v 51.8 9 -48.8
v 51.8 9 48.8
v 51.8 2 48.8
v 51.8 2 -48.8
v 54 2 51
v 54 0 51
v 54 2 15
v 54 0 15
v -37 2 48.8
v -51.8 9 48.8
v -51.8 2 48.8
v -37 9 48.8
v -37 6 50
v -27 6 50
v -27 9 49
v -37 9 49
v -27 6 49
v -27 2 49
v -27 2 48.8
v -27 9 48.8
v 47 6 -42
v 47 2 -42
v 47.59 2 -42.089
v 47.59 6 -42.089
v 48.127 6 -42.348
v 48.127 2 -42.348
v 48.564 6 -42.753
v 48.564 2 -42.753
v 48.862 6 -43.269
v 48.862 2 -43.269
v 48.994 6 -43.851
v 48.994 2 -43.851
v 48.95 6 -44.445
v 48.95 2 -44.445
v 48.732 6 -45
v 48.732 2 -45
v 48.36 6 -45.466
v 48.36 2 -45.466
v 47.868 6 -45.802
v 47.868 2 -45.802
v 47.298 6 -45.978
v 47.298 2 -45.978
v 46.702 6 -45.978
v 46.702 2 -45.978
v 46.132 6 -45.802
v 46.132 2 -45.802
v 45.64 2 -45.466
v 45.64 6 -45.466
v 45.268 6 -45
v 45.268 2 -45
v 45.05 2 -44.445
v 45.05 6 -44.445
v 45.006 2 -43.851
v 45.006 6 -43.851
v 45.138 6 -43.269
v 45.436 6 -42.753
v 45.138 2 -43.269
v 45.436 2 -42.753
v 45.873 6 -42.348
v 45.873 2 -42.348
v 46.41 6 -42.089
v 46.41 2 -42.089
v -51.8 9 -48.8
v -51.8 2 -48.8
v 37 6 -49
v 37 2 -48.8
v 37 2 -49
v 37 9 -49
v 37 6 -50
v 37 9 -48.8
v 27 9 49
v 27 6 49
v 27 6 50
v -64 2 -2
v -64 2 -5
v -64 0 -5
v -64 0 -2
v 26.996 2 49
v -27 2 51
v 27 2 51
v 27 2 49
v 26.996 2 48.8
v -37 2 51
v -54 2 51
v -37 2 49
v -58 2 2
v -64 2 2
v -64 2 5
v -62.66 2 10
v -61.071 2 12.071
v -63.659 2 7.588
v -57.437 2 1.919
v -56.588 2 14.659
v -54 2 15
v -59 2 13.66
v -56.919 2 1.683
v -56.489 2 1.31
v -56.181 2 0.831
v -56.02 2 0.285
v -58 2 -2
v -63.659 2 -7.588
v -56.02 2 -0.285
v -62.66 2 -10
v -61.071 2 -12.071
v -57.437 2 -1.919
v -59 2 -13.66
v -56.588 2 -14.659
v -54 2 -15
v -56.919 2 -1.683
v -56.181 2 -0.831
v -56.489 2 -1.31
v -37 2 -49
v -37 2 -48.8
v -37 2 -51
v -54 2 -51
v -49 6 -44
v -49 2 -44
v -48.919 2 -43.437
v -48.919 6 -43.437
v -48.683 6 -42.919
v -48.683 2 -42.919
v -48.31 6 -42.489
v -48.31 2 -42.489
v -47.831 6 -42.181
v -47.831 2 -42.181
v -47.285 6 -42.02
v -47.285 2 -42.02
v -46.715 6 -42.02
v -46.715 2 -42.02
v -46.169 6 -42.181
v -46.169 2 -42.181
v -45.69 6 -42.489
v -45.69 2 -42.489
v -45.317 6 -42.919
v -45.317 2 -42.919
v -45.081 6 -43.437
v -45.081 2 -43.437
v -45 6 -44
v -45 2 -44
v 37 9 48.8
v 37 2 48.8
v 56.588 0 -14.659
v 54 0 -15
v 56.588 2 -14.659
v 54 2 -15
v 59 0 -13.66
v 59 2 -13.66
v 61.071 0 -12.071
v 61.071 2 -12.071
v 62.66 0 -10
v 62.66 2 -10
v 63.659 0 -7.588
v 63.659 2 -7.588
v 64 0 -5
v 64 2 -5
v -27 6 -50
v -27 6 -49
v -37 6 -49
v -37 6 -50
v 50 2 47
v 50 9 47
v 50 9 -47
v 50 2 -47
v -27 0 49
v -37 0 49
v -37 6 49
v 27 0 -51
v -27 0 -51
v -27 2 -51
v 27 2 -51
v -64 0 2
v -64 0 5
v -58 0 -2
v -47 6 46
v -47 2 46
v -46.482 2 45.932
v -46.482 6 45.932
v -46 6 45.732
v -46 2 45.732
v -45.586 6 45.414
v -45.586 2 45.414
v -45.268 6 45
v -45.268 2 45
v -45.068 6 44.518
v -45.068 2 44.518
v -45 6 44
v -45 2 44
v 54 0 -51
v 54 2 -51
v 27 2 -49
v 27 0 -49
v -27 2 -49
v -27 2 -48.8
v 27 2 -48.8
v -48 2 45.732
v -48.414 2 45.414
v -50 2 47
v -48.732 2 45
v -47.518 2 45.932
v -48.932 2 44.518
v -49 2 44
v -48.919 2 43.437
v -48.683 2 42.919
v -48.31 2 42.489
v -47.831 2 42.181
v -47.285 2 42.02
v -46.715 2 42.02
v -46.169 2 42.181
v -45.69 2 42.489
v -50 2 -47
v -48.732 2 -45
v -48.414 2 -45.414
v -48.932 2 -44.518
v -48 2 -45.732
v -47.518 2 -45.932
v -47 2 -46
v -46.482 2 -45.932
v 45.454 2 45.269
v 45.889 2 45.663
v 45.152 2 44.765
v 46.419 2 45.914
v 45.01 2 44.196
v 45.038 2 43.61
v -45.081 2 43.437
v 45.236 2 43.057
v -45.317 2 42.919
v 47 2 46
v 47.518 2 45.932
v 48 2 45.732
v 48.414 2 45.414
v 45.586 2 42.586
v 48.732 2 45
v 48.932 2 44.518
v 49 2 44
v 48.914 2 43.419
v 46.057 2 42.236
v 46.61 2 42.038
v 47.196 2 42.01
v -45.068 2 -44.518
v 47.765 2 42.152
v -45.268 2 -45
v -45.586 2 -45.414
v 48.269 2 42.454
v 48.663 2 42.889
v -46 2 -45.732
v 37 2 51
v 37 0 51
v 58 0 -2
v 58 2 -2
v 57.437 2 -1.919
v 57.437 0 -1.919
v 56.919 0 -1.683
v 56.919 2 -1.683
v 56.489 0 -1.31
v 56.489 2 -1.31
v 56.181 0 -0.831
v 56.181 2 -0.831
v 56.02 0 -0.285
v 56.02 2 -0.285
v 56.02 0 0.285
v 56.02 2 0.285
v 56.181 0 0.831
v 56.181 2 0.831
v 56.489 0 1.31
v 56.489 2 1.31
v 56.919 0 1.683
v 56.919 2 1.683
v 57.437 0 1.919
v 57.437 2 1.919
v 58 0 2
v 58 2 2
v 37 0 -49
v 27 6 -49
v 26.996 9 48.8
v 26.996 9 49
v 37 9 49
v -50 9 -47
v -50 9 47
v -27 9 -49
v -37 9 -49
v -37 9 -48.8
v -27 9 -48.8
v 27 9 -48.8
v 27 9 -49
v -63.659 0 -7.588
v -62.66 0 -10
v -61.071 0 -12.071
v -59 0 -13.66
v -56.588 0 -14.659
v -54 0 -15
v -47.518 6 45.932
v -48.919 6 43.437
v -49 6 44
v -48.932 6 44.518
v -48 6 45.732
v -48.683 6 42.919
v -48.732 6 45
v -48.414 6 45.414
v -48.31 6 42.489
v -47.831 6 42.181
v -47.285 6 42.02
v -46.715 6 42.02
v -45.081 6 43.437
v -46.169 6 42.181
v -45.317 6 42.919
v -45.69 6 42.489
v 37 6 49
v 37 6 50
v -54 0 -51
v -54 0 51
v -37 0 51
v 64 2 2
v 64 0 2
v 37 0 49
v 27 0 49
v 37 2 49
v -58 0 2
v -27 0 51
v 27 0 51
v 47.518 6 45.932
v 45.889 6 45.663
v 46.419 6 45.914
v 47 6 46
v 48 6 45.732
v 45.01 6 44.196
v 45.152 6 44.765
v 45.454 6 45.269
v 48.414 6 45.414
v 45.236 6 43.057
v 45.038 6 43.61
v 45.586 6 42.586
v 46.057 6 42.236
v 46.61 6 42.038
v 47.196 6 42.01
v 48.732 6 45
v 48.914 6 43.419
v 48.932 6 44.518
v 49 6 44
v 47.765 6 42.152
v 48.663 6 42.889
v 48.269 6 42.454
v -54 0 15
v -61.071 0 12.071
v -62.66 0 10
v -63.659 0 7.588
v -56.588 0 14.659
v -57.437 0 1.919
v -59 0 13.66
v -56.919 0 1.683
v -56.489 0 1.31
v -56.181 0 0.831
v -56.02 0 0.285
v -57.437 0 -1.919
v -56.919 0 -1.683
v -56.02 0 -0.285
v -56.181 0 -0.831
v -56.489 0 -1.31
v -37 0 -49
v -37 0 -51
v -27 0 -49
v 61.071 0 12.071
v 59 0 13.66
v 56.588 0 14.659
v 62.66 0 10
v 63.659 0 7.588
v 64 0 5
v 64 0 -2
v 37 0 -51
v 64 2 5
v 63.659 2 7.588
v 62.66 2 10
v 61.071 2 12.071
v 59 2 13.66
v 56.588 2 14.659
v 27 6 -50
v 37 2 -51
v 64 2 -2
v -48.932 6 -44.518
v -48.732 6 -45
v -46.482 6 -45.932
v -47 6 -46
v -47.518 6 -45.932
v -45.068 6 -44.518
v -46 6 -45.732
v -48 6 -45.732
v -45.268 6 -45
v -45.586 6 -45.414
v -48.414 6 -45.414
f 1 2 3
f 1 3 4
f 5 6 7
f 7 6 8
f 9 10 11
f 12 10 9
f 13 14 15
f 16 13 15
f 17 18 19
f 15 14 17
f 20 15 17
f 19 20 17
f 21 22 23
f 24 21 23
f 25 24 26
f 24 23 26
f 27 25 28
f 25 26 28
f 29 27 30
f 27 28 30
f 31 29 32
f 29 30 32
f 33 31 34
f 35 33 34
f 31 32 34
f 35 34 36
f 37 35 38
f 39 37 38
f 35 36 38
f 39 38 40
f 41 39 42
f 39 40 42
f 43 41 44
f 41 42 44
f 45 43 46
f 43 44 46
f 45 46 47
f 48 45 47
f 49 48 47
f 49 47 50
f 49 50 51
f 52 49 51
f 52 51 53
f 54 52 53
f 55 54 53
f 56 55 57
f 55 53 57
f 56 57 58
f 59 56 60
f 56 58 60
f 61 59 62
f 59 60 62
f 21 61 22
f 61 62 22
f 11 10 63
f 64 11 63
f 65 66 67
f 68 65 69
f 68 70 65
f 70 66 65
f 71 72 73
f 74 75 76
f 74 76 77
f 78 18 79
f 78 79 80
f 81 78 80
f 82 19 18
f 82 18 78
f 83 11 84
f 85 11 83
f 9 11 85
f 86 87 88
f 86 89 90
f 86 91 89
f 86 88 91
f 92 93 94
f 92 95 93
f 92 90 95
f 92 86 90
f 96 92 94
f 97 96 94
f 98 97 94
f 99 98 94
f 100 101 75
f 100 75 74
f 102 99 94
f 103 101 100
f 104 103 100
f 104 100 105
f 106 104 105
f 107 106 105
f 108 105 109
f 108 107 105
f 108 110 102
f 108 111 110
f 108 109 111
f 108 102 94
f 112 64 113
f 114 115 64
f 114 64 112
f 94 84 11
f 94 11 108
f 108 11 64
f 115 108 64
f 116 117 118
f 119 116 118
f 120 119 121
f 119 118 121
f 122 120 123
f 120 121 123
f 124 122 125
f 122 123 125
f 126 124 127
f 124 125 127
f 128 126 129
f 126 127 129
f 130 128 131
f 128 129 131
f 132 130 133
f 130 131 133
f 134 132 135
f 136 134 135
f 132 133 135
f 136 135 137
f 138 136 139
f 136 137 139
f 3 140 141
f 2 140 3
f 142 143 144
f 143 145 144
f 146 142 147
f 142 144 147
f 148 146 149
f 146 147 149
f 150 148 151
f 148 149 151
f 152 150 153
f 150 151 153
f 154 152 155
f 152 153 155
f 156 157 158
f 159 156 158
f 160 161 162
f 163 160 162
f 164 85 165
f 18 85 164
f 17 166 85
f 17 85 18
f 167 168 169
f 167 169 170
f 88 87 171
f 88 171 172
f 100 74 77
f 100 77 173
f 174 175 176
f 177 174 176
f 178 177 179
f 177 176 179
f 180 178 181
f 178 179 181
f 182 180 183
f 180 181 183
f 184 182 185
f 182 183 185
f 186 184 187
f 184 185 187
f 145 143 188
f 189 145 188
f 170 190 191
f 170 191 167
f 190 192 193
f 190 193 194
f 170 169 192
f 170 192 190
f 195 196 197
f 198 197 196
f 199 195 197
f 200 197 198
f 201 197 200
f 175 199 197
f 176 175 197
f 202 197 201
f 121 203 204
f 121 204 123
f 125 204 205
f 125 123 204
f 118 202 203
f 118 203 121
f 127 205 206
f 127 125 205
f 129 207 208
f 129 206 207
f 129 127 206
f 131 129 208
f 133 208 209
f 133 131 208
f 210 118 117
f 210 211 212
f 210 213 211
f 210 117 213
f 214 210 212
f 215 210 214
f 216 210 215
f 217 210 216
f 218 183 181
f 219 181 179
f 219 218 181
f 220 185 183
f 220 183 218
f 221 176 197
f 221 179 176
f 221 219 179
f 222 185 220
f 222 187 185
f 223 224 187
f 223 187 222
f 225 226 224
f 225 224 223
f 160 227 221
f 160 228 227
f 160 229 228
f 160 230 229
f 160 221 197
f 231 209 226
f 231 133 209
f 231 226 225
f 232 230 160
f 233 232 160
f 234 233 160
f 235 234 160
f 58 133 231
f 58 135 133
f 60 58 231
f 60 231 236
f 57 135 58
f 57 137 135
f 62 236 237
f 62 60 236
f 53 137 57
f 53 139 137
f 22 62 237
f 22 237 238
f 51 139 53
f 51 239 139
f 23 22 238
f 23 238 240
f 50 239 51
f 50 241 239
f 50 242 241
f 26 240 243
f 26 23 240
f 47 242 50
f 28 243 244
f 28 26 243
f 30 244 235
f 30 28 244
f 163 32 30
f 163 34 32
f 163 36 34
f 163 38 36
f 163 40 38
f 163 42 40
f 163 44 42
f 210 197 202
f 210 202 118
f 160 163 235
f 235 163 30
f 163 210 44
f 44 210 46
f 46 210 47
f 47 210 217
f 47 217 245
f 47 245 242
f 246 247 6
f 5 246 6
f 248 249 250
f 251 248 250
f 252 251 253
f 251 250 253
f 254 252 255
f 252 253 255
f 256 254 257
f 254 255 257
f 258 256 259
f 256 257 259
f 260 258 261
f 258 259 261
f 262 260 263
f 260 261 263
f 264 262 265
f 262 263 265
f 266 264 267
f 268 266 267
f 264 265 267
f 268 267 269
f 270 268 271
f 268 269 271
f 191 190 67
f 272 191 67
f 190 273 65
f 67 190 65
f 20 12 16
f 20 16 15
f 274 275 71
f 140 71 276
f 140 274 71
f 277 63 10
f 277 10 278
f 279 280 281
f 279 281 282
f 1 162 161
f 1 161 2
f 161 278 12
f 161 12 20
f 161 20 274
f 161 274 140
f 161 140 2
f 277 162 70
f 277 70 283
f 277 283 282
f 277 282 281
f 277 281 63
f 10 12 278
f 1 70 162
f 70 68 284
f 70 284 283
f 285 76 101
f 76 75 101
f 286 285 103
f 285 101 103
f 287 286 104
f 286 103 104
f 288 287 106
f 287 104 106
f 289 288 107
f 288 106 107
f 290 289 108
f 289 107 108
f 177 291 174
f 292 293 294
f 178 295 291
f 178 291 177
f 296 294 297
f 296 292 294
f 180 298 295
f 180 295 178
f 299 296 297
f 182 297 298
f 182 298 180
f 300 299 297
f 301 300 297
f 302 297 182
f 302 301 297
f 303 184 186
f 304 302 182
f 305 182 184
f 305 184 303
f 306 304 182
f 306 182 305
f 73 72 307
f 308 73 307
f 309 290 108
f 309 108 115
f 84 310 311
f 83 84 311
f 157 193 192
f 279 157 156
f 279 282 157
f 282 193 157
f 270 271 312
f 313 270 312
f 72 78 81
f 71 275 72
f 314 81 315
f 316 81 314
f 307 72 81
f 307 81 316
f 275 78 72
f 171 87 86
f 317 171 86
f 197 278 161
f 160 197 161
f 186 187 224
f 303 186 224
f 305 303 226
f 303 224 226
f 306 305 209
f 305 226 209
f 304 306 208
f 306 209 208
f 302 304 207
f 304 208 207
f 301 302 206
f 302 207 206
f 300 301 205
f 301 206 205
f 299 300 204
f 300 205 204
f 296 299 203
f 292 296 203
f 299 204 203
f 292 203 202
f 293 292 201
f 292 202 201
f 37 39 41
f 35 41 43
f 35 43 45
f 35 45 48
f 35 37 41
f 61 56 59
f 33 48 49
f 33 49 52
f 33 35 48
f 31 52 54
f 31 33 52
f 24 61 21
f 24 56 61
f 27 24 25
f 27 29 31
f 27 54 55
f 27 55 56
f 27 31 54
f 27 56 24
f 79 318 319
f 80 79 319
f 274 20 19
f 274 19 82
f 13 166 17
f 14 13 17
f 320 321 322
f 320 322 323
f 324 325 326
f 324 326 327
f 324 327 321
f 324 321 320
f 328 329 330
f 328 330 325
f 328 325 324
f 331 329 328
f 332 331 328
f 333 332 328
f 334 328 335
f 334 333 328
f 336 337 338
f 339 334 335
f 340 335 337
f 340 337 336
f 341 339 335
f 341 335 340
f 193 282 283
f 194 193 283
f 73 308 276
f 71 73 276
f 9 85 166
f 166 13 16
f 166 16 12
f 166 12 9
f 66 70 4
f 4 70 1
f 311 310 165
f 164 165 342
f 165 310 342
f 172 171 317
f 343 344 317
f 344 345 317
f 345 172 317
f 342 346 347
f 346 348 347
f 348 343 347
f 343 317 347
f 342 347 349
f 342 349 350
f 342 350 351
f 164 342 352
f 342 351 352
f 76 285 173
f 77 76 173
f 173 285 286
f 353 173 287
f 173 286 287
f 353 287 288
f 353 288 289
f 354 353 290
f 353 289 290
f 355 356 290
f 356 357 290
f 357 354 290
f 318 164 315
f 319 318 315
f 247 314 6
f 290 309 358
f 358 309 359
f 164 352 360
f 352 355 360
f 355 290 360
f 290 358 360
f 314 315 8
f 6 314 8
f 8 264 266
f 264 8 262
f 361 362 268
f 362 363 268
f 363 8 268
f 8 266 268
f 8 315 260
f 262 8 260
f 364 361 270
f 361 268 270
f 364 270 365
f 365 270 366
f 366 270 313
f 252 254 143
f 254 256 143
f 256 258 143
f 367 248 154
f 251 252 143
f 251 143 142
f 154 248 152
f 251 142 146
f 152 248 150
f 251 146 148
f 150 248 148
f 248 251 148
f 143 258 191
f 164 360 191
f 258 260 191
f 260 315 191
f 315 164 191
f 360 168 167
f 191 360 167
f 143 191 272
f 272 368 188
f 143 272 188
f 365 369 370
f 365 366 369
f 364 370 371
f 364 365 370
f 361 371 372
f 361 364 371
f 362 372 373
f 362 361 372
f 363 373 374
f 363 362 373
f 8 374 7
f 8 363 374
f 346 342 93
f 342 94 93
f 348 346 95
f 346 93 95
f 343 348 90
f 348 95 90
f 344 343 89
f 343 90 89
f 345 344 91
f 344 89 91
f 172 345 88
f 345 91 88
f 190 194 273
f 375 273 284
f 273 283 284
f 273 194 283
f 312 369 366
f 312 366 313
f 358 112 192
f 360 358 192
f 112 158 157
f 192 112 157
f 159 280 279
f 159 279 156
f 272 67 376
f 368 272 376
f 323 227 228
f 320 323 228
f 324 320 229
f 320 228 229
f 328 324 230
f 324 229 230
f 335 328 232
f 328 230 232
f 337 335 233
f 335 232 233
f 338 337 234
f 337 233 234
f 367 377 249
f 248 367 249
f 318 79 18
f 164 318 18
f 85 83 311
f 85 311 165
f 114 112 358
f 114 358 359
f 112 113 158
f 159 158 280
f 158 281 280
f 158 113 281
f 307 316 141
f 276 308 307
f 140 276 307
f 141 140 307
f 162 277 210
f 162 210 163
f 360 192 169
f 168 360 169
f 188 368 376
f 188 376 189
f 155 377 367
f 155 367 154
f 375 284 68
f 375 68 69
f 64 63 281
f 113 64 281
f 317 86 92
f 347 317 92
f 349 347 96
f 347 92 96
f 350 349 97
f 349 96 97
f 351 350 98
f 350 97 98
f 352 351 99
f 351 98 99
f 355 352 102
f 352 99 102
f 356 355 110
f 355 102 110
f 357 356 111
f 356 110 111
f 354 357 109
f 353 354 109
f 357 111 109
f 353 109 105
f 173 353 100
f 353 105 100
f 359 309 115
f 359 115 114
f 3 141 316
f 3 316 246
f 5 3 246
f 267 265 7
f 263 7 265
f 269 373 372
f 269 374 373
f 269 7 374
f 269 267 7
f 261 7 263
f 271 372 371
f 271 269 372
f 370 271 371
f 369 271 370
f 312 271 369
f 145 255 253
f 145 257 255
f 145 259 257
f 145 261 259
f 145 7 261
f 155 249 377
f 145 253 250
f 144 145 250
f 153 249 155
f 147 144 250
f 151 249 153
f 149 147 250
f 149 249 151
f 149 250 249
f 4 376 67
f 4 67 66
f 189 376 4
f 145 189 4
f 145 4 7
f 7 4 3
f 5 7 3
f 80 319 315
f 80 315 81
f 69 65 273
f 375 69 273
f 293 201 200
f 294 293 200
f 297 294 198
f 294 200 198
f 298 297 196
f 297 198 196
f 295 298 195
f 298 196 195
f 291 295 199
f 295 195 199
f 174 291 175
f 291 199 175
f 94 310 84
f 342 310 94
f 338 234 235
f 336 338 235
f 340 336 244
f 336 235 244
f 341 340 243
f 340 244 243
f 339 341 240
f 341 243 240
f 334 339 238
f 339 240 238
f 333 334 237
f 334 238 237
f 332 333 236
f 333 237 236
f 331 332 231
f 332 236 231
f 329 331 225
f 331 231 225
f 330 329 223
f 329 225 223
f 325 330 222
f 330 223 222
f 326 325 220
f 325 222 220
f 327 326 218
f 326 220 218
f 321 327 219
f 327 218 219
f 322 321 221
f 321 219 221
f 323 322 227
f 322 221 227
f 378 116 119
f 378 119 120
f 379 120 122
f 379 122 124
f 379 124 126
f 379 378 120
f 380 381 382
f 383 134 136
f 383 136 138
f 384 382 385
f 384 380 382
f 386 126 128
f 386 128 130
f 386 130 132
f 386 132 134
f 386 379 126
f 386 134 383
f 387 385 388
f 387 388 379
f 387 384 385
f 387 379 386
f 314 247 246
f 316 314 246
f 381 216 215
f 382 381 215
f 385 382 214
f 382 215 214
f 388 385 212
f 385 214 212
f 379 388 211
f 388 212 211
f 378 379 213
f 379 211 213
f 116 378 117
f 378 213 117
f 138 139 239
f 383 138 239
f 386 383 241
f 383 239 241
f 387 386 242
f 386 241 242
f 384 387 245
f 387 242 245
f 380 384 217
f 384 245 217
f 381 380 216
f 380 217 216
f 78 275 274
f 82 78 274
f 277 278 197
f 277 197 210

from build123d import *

# Parameters (mm, degrees)
SKETCH1_W            = 108
SKETCH1_H            = 102
BOSS_EXTRUDE1_DEPTH  = 2
SKETCH2_W            = 104
SKETCH2_H            = 98
BOSS_EXTRUDE2_DEPTH  = 7
SKETCH3_W            = 100
SKETCH3_H            = 94
CUT_EXTRUDE1_DEPTH   = 7
SKETCH4_W            = 10
SKETCH4_H            = 3
BOSS_EXTRUDE6_DEPTH  = 1
CUT_EXTRUDE2_DEPTH   = 10
SKETCH6_W            = 10
SKETCH6_H            = 3
BOSS_EXTRUDE7_DEPTH  = 1
CUT_EXTRUDE3_DEPTH   = 10
SKETCH9_W            = 10
SKETCH9_H            = 3
BOSS_EXTRUDE9_DEPTH  = 1
CUT_EXTRUDE4_DEPTH   = 10
SKETCH11_W           = 10
SKETCH11_H           = 3
BOSS_EXTRUDE10_DEPTH = 1
CUT_EXTRUDE5_DEPTH   = 10
SKETCH20_W           = 10
SKETCH20_H           = 2
CUT_EXTRUDE7_DEPTH   = 2
SKETCH21_W           = 10
SKETCH21_H           = 2
CUT_EXTRUDE8_DEPTH   = 2
SKETCH22_W           = 10
SKETCH22_H           = 2
CUT_EXTRUDE9_DEPTH   = 2
SKETCH23_W           = 10
SKETCH23_H           = 2
CUT_EXTRUDE11_DEPTH  = 2
SKETCH24_R           = 2
BOSS_EXTRUDE11_DEPTH = 4
BOSS_EXTRUDE12_DEPTH = 4
BOSS_EXTRUDE13_DEPTH = 4
BOSS_EXTRUDE14_DEPTH = 4
SKETCH28_W           = 30
SKETCH28_H           = 2
BOSS_EXTRUDE15_DEPTH = 10
SKETCH29_R           = 2
SKETCH29_W           = 6
SKETCH29_H           = 4
CUT_EXTRUDE12_DEPTH  = 2
FILLET1_R            = 10
SKETCH30_W           = 30
SKETCH30_H           = 1
BOSS_EXTRUDE16_DEPTH = 10
CUT_EXTRUDE13_DEPTH  = 2
FILLET2_R            = 10
SKETCH33_W           = 0.2
SKETCH33_H           = 98
CUT_EXTRUDE14_DEPTH  = 7
SKETCH34_W           = 14.8
SKETCH34_H           = 0.2
CUT_EXTRUDE15_DEPTH  = 7
SKETCH35_W           = 54
SKETCH35_H           = 0.2
CUT_EXTRUDE16_DEPTH  = 7
SKETCH36_W           = 15
SKETCH36_H           = 0.2
CUT_EXTRUDE17_DEPTH  = 7
SKETCH37_W           = 0.2
SKETCH37_H           = 97.8
CUT_EXTRUDE18_DEPTH  = 7
SKETCH39_W           = 14.8
SKETCH39_H           = 0.2
CUT_EXTRUDE19_DEPTH  = 7
SKETCH41_W           = 53.996290736
SKETCH41_H           = 0.2
CUT_EXTRUDE20_DEPTH  = 7
SKETCH42_W           = 14.8
SKETCH42_H           = 0.2
CUT_EXTRUDE21_DEPTH  = 7


with BuildPart() as part:
    # Sketch1 → Boss-Extrude1 (new body)
    with BuildSketch(Plane(origin=(0, 0, 0), x_dir=(1, 0, 0), z_dir=(0, 1, 0))):
        Rectangle(SKETCH1_W, SKETCH1_H)
    extrude(amount=BOSS_EXTRUDE1_DEPTH)

    # Sketch2 → Boss-Extrude2 (add)
    with BuildSketch(Plane(origin=(0, 2, 0), x_dir=(1, 0, 0), z_dir=(0, 1, 0))):
        Rectangle(SKETCH2_W, SKETCH2_H)
    extrude(amount=BOSS_EXTRUDE2_DEPTH)

    # Sketch3 → Cut-Extrude1 (cut)
    with BuildSketch(Plane(origin=(0, 9, 0), x_dir=(1, 0, 0), z_dir=(0, 1, 0))):
        Rectangle(SKETCH3_W, SKETCH3_H)
    extrude(amount=-CUT_EXTRUDE1_DEPTH, mode=Mode.SUBTRACT)

    # Sketch4 → Boss-Extrude6 (add)
    with BuildSketch(Plane.XY.offset(49)):
        with Locations((-32, 7.5)):
            Rectangle(SKETCH4_W, SKETCH4_H)
    extrude(amount=BOSS_EXTRUDE6_DEPTH)

    # Sketch5 → Cut-Extrude2 (cut)
    with BuildSketch(Plane(origin=(-27, 0, 0), x_dir=(0, 0, -1), z_dir=(1, 0, 0))):
        Polygon((-50, 6), (-49, 9), (-50, 9), align=None)
    extrude(amount=-CUT_EXTRUDE2_DEPTH, mode=Mode.SUBTRACT)

    # Sketch6 → Boss-Extrude7 (add)
    with BuildSketch(Plane.XY.offset(49)):
        with Locations((32, 7.5)):
            Rectangle(SKETCH6_W, SKETCH6_H)
    extrude(amount=BOSS_EXTRUDE7_DEPTH)

    # Sketch7 → Cut-Extrude3 (cut)
    with BuildSketch(Plane(origin=(37, 0, 0), x_dir=(0, 0, -1), z_dir=(1, 0, 0))):
        Polygon((-50, 6), (-49, 9), (-50, 9), align=None)
    extrude(amount=-CUT_EXTRUDE3_DEPTH, mode=Mode.SUBTRACT)

    # Sketch9 → Boss-Extrude9 (add)
    with BuildSketch(Plane(origin=(0, 0, -49), x_dir=(-1, 0, 0), z_dir=(0, 0, -1))):
        with Locations((-32, 7.5)):
            Rectangle(SKETCH9_W, SKETCH9_H)
    extrude(amount=BOSS_EXTRUDE9_DEPTH)

    # Sketch10 → Cut-Extrude4 (cut)
    with BuildSketch(Plane.ZY.offset(-27)):
        Polygon((-49, 9), (-50, 6), (-50, 9), align=None)
    extrude(amount=-CUT_EXTRUDE4_DEPTH, mode=Mode.SUBTRACT)

    # Sketch11 → Boss-Extrude10 (add)
    with BuildSketch(Plane(origin=(0, 0, -49), x_dir=(-1, 0, 0), z_dir=(0, 0, -1))):
        with Locations((32, 7.5)):
            Rectangle(SKETCH11_W, SKETCH11_H)
    extrude(amount=BOSS_EXTRUDE10_DEPTH)

    # Sketch12 → Cut-Extrude5 (cut)
    with BuildSketch(Plane.ZY.offset(37)):
        Polygon((-49, 9), (-50, 6), (-50, 9), align=None)
    extrude(amount=-CUT_EXTRUDE5_DEPTH, mode=Mode.SUBTRACT)

    # Sketch20 → Cut-Extrude7 (cut)
    with BuildSketch(Plane.XY.offset(51)):
        with Locations((32, 1)):
            Rectangle(SKETCH20_W, SKETCH20_H)
    extrude(amount=-CUT_EXTRUDE7_DEPTH, mode=Mode.SUBTRACT)

    # Sketch21 → Cut-Extrude8 (cut)
    with BuildSketch(Plane(origin=(0, 2, 0), x_dir=(1, 0, 0), z_dir=(0, 1, 0))):
        with Locations((-32, -50)):
            Rectangle(SKETCH21_W, SKETCH21_H)
    extrude(amount=-CUT_EXTRUDE8_DEPTH, mode=Mode.SUBTRACT)

    # Sketch22 → Cut-Extrude9 (cut)
    with BuildSketch(Plane(origin=(0, 2, 0), x_dir=(1, 0, 0), z_dir=(0, 1, 0))):
        with Locations((32, 50)):
            Rectangle(SKETCH22_W, SKETCH22_H)
    extrude(amount=-CUT_EXTRUDE9_DEPTH, mode=Mode.SUBTRACT)

    # Sketch23 → Cut-Extrude11 (cut)
    with BuildSketch(Plane(origin=(0, 2, 0), x_dir=(1, 0, 0), z_dir=(0, 1, 0))):
        with Locations((-32, 50)):
            Rectangle(SKETCH23_W, SKETCH23_H)
    extrude(amount=-CUT_EXTRUDE11_DEPTH, mode=Mode.SUBTRACT)

    # Sketch24 → Boss-Extrude11 (add)
    with BuildSketch(Plane(origin=(0, 2, 0), x_dir=(1, 0, 0), z_dir=(0, 1, 0))):
        with Locations(Location((47, 44, 0), (0, 0, 270))):
            Circle(SKETCH24_R)
    extrude(amount=BOSS_EXTRUDE11_DEPTH)

    # Sketch25 → Boss-Extrude12 (add)
    with BuildSketch(Plane(origin=(0, 2, 0), x_dir=(1, 0, 0), z_dir=(0, 1, 0))):
        with BuildLine():
            ThreePointArc((-45, 44), (-45.585786438, 45.414213562), (-47, 46))
            Line((-47, 46), (-47, 44))
            Line((-47, 44), (-49, 44))
            ThreePointArc((-49, 44), (-47, 42), (-45, 44))
        make_face()
        with BuildLine():
            Line((-47, 44), (-47, 46))
            ThreePointArc((-47, 46), (-48.414213562, 45.414213562), (-49, 44))
            Line((-49, 44), (-47, 44))
        make_face()
    extrude(amount=BOSS_EXTRUDE12_DEPTH)

    # Sketch26 → Boss-Extrude13 (add)
    with BuildSketch(Plane(origin=(0, 2, 0), x_dir=(1, 0, 0), z_dir=(0, 1, 0))):
        with BuildLine():
            ThreePointArc((-49, -44), (-48.414213562, -45.414213562), (-47, -46))
            Line((-47, -46), (-47, -44))
            Line((-47, -44), (-49, -44))
        make_face()
        with BuildLine():
            Line((-47, -44), (-47, -46))
            ThreePointArc((-47, -46), (-45.585786438, -45.414213562), (-45, -44))
            ThreePointArc((-45, -44), (-47, -42), (-49, -44))
            Line((-49, -44), (-47, -44))
        make_face()
    extrude(amount=BOSS_EXTRUDE13_DEPTH)

    # Sketch27 → Boss-Extrude14 (add)
    with BuildSketch(Plane(origin=(0, 2, 0), x_dir=(1, 0, 0), z_dir=(0, 1, 0))):
        with BuildLine():
            ThreePointArc((49, -44), (45.585786438, -42.585786438), (47, -46))
            Line((47, -46), (47, -44))
            Line((47, -44), (49, -44))
        make_face()
        with BuildLine():
            Line((47, -44), (47, -46))
            ThreePointArc((47, -46), (48.414213562, -45.414213562), (49, -44))
            Line((49, -44), (47, -44))
        make_face()
    extrude(amount=BOSS_EXTRUDE14_DEPTH)

    # Sketch28 → Boss-Extrude15 (add)
    with BuildSketch(Plane.ZY.offset(54)):
        with Locations((0, 1)):
            Rectangle(SKETCH28_W, SKETCH28_H)
    extrude(amount=BOSS_EXTRUDE15_DEPTH)

    # Sketch29 → Cut-Extrude12 (cut)
    with BuildSketch(Plane(origin=(0, 2, 0), x_dir=(1, 0, 0), z_dir=(0, 1, 0))):
        with Locations((-58, 0)):
            Circle(SKETCH29_R)
        with Locations((-61, 0)):
            Rectangle(SKETCH29_W, SKETCH29_H)
    extrude(amount=-CUT_EXTRUDE12_DEPTH, mode=Mode.SUBTRACT)

    # Fillet1
    fillet1_edges = [part.edges().sort_by_distance(p)[0] for p in [
        (-64, 1, 15),
        (-64, 1, -15),
    ]]
    fillet(fillet1_edges, radius=FILLET1_R - 0.0001)  # a hair under: the kernel refuses the full size

    # Sketch30 → Boss-Extrude16 (add)
    with BuildSketch(Plane(origin=(54, 0, 0), x_dir=(0, 0, -1), z_dir=(1, 0, 0))):
        with Locations((0, 1.5)):
            Rectangle(SKETCH30_W, SKETCH30_H)
        with Locations((0, 0.5)):
            Rectangle(SKETCH30_W, SKETCH30_H)
    extrude(amount=BOSS_EXTRUDE16_DEPTH)

    # Sketch32 → Cut-Extrude13 (cut)
    with BuildSketch(Plane(origin=(0, 2, 0), x_dir=(1, 0, 0), z_dir=(0, 1, 0))):
        with BuildLine():
            Line((58, -2), (64, -2))
            Line((64, -2), (64, 2))
            Line((64, 2), (58, 2))
            ThreePointArc((58, 2), (59.414213562, 1.414213562), (60, 0))
            ThreePointArc((60, 0), (59.414213562, -1.414213562), (58, -2))
        make_face()
        with BuildLine():
            ThreePointArc((58, 2), (56, 0), (58, -2))
            Line((58, -2), (58, 2))
        make_face()
        with BuildLine():
            Line((58, 2), (58, -2))
            ThreePointArc((58, -2), (59.414213562, -1.414213562), (60, 0))
            ThreePointArc((60, 0), (59.414213562, 1.414213562), (58, 2))
        make_face()
    extrude(amount=-CUT_EXTRUDE13_DEPTH, mode=Mode.SUBTRACT)

    # Fillet2
    fillet2_edges = [part.edges().sort_by_distance(p)[0] for p in [
        (64, 1, -15),
        (64, 1, 15),
    ]]
    fillet(fillet2_edges, radius=FILLET2_R - 0.0001)  # a hair under: the kernel refuses the full size

    # Sketch33 → Cut-Extrude14 (cut)
    with BuildSketch(Plane(origin=(0, 9, 0), x_dir=(1, 0, 0), z_dir=(0, 1, 0))):
        with Locations((51.9, 0)):
            Rectangle(SKETCH33_W, SKETCH33_H)
    extrude(amount=-CUT_EXTRUDE14_DEPTH, mode=Mode.SUBTRACT)

    # Sketch34 → Cut-Extrude15 (cut)
    with BuildSketch(Plane(origin=(0, 9, 0), x_dir=(1, 0, 0), z_dir=(0, 1, 0))):
        with Locations((44.4, 48.9)):
            Rectangle(SKETCH34_W, SKETCH34_H)
    extrude(amount=-CUT_EXTRUDE15_DEPTH, mode=Mode.SUBTRACT)

    # Sketch35 → Cut-Extrude16 (cut)
    with BuildSketch(Plane(origin=(0, 9, 0), x_dir=(1, 0, 0), z_dir=(0, 1, 0))):
        with Locations((0, 48.9)):
            Rectangle(SKETCH35_W, SKETCH35_H)
    extrude(amount=-CUT_EXTRUDE16_DEPTH, mode=Mode.SUBTRACT)

    # Sketch36 → Cut-Extrude17 (cut)
    with BuildSketch(Plane(origin=(0, 9, 0), x_dir=(1, 0, 0), z_dir=(0, 1, 0))):
        with Locations((-44.5, 48.9)):
            Rectangle(SKETCH36_W, SKETCH36_H)
    extrude(amount=-CUT_EXTRUDE17_DEPTH, mode=Mode.SUBTRACT)

    # Sketch37 → Cut-Extrude18 (cut)
    with BuildSketch(Plane(origin=(0, 9, 0), x_dir=(1, 0, 0), z_dir=(0, 1, 0))):
        with Locations((-51.9, -0.1)):
            Rectangle(SKETCH37_W, SKETCH37_H)
    extrude(amount=-CUT_EXTRUDE18_DEPTH, mode=Mode.SUBTRACT)

    # Sketch39 → Cut-Extrude19 (cut)
    with BuildSketch(Plane(origin=(0, 9, 0), x_dir=(1, 0, 0), z_dir=(0, 1, 0))):
        with Locations((-44.4, -48.9)):
            Rectangle(SKETCH39_W, SKETCH39_H)
    extrude(amount=-CUT_EXTRUDE19_DEPTH, mode=Mode.SUBTRACT)

    # Sketch41 → Cut-Extrude20 (cut)
    with BuildSketch(Plane(origin=(0, 9, 0), x_dir=(1, 0, 0), z_dir=(0, 1, 0))):
        with Locations((-0.001854632, -48.9)):
            Rectangle(SKETCH41_W, SKETCH41_H)
    extrude(amount=-CUT_EXTRUDE20_DEPTH, mode=Mode.SUBTRACT)

    # Sketch42 → Cut-Extrude21 (cut)
    with BuildSketch(Plane(origin=(0, 9, 0), x_dir=(1, 0, 0), z_dir=(0, 1, 0))):
        with Locations((44.4, -48.9)):
            Rectangle(SKETCH42_W, SKETCH42_H)
    extrude(amount=-CUT_EXTRUDE21_DEPTH, mode=Mode.SUBTRACT)


solid = part.part
